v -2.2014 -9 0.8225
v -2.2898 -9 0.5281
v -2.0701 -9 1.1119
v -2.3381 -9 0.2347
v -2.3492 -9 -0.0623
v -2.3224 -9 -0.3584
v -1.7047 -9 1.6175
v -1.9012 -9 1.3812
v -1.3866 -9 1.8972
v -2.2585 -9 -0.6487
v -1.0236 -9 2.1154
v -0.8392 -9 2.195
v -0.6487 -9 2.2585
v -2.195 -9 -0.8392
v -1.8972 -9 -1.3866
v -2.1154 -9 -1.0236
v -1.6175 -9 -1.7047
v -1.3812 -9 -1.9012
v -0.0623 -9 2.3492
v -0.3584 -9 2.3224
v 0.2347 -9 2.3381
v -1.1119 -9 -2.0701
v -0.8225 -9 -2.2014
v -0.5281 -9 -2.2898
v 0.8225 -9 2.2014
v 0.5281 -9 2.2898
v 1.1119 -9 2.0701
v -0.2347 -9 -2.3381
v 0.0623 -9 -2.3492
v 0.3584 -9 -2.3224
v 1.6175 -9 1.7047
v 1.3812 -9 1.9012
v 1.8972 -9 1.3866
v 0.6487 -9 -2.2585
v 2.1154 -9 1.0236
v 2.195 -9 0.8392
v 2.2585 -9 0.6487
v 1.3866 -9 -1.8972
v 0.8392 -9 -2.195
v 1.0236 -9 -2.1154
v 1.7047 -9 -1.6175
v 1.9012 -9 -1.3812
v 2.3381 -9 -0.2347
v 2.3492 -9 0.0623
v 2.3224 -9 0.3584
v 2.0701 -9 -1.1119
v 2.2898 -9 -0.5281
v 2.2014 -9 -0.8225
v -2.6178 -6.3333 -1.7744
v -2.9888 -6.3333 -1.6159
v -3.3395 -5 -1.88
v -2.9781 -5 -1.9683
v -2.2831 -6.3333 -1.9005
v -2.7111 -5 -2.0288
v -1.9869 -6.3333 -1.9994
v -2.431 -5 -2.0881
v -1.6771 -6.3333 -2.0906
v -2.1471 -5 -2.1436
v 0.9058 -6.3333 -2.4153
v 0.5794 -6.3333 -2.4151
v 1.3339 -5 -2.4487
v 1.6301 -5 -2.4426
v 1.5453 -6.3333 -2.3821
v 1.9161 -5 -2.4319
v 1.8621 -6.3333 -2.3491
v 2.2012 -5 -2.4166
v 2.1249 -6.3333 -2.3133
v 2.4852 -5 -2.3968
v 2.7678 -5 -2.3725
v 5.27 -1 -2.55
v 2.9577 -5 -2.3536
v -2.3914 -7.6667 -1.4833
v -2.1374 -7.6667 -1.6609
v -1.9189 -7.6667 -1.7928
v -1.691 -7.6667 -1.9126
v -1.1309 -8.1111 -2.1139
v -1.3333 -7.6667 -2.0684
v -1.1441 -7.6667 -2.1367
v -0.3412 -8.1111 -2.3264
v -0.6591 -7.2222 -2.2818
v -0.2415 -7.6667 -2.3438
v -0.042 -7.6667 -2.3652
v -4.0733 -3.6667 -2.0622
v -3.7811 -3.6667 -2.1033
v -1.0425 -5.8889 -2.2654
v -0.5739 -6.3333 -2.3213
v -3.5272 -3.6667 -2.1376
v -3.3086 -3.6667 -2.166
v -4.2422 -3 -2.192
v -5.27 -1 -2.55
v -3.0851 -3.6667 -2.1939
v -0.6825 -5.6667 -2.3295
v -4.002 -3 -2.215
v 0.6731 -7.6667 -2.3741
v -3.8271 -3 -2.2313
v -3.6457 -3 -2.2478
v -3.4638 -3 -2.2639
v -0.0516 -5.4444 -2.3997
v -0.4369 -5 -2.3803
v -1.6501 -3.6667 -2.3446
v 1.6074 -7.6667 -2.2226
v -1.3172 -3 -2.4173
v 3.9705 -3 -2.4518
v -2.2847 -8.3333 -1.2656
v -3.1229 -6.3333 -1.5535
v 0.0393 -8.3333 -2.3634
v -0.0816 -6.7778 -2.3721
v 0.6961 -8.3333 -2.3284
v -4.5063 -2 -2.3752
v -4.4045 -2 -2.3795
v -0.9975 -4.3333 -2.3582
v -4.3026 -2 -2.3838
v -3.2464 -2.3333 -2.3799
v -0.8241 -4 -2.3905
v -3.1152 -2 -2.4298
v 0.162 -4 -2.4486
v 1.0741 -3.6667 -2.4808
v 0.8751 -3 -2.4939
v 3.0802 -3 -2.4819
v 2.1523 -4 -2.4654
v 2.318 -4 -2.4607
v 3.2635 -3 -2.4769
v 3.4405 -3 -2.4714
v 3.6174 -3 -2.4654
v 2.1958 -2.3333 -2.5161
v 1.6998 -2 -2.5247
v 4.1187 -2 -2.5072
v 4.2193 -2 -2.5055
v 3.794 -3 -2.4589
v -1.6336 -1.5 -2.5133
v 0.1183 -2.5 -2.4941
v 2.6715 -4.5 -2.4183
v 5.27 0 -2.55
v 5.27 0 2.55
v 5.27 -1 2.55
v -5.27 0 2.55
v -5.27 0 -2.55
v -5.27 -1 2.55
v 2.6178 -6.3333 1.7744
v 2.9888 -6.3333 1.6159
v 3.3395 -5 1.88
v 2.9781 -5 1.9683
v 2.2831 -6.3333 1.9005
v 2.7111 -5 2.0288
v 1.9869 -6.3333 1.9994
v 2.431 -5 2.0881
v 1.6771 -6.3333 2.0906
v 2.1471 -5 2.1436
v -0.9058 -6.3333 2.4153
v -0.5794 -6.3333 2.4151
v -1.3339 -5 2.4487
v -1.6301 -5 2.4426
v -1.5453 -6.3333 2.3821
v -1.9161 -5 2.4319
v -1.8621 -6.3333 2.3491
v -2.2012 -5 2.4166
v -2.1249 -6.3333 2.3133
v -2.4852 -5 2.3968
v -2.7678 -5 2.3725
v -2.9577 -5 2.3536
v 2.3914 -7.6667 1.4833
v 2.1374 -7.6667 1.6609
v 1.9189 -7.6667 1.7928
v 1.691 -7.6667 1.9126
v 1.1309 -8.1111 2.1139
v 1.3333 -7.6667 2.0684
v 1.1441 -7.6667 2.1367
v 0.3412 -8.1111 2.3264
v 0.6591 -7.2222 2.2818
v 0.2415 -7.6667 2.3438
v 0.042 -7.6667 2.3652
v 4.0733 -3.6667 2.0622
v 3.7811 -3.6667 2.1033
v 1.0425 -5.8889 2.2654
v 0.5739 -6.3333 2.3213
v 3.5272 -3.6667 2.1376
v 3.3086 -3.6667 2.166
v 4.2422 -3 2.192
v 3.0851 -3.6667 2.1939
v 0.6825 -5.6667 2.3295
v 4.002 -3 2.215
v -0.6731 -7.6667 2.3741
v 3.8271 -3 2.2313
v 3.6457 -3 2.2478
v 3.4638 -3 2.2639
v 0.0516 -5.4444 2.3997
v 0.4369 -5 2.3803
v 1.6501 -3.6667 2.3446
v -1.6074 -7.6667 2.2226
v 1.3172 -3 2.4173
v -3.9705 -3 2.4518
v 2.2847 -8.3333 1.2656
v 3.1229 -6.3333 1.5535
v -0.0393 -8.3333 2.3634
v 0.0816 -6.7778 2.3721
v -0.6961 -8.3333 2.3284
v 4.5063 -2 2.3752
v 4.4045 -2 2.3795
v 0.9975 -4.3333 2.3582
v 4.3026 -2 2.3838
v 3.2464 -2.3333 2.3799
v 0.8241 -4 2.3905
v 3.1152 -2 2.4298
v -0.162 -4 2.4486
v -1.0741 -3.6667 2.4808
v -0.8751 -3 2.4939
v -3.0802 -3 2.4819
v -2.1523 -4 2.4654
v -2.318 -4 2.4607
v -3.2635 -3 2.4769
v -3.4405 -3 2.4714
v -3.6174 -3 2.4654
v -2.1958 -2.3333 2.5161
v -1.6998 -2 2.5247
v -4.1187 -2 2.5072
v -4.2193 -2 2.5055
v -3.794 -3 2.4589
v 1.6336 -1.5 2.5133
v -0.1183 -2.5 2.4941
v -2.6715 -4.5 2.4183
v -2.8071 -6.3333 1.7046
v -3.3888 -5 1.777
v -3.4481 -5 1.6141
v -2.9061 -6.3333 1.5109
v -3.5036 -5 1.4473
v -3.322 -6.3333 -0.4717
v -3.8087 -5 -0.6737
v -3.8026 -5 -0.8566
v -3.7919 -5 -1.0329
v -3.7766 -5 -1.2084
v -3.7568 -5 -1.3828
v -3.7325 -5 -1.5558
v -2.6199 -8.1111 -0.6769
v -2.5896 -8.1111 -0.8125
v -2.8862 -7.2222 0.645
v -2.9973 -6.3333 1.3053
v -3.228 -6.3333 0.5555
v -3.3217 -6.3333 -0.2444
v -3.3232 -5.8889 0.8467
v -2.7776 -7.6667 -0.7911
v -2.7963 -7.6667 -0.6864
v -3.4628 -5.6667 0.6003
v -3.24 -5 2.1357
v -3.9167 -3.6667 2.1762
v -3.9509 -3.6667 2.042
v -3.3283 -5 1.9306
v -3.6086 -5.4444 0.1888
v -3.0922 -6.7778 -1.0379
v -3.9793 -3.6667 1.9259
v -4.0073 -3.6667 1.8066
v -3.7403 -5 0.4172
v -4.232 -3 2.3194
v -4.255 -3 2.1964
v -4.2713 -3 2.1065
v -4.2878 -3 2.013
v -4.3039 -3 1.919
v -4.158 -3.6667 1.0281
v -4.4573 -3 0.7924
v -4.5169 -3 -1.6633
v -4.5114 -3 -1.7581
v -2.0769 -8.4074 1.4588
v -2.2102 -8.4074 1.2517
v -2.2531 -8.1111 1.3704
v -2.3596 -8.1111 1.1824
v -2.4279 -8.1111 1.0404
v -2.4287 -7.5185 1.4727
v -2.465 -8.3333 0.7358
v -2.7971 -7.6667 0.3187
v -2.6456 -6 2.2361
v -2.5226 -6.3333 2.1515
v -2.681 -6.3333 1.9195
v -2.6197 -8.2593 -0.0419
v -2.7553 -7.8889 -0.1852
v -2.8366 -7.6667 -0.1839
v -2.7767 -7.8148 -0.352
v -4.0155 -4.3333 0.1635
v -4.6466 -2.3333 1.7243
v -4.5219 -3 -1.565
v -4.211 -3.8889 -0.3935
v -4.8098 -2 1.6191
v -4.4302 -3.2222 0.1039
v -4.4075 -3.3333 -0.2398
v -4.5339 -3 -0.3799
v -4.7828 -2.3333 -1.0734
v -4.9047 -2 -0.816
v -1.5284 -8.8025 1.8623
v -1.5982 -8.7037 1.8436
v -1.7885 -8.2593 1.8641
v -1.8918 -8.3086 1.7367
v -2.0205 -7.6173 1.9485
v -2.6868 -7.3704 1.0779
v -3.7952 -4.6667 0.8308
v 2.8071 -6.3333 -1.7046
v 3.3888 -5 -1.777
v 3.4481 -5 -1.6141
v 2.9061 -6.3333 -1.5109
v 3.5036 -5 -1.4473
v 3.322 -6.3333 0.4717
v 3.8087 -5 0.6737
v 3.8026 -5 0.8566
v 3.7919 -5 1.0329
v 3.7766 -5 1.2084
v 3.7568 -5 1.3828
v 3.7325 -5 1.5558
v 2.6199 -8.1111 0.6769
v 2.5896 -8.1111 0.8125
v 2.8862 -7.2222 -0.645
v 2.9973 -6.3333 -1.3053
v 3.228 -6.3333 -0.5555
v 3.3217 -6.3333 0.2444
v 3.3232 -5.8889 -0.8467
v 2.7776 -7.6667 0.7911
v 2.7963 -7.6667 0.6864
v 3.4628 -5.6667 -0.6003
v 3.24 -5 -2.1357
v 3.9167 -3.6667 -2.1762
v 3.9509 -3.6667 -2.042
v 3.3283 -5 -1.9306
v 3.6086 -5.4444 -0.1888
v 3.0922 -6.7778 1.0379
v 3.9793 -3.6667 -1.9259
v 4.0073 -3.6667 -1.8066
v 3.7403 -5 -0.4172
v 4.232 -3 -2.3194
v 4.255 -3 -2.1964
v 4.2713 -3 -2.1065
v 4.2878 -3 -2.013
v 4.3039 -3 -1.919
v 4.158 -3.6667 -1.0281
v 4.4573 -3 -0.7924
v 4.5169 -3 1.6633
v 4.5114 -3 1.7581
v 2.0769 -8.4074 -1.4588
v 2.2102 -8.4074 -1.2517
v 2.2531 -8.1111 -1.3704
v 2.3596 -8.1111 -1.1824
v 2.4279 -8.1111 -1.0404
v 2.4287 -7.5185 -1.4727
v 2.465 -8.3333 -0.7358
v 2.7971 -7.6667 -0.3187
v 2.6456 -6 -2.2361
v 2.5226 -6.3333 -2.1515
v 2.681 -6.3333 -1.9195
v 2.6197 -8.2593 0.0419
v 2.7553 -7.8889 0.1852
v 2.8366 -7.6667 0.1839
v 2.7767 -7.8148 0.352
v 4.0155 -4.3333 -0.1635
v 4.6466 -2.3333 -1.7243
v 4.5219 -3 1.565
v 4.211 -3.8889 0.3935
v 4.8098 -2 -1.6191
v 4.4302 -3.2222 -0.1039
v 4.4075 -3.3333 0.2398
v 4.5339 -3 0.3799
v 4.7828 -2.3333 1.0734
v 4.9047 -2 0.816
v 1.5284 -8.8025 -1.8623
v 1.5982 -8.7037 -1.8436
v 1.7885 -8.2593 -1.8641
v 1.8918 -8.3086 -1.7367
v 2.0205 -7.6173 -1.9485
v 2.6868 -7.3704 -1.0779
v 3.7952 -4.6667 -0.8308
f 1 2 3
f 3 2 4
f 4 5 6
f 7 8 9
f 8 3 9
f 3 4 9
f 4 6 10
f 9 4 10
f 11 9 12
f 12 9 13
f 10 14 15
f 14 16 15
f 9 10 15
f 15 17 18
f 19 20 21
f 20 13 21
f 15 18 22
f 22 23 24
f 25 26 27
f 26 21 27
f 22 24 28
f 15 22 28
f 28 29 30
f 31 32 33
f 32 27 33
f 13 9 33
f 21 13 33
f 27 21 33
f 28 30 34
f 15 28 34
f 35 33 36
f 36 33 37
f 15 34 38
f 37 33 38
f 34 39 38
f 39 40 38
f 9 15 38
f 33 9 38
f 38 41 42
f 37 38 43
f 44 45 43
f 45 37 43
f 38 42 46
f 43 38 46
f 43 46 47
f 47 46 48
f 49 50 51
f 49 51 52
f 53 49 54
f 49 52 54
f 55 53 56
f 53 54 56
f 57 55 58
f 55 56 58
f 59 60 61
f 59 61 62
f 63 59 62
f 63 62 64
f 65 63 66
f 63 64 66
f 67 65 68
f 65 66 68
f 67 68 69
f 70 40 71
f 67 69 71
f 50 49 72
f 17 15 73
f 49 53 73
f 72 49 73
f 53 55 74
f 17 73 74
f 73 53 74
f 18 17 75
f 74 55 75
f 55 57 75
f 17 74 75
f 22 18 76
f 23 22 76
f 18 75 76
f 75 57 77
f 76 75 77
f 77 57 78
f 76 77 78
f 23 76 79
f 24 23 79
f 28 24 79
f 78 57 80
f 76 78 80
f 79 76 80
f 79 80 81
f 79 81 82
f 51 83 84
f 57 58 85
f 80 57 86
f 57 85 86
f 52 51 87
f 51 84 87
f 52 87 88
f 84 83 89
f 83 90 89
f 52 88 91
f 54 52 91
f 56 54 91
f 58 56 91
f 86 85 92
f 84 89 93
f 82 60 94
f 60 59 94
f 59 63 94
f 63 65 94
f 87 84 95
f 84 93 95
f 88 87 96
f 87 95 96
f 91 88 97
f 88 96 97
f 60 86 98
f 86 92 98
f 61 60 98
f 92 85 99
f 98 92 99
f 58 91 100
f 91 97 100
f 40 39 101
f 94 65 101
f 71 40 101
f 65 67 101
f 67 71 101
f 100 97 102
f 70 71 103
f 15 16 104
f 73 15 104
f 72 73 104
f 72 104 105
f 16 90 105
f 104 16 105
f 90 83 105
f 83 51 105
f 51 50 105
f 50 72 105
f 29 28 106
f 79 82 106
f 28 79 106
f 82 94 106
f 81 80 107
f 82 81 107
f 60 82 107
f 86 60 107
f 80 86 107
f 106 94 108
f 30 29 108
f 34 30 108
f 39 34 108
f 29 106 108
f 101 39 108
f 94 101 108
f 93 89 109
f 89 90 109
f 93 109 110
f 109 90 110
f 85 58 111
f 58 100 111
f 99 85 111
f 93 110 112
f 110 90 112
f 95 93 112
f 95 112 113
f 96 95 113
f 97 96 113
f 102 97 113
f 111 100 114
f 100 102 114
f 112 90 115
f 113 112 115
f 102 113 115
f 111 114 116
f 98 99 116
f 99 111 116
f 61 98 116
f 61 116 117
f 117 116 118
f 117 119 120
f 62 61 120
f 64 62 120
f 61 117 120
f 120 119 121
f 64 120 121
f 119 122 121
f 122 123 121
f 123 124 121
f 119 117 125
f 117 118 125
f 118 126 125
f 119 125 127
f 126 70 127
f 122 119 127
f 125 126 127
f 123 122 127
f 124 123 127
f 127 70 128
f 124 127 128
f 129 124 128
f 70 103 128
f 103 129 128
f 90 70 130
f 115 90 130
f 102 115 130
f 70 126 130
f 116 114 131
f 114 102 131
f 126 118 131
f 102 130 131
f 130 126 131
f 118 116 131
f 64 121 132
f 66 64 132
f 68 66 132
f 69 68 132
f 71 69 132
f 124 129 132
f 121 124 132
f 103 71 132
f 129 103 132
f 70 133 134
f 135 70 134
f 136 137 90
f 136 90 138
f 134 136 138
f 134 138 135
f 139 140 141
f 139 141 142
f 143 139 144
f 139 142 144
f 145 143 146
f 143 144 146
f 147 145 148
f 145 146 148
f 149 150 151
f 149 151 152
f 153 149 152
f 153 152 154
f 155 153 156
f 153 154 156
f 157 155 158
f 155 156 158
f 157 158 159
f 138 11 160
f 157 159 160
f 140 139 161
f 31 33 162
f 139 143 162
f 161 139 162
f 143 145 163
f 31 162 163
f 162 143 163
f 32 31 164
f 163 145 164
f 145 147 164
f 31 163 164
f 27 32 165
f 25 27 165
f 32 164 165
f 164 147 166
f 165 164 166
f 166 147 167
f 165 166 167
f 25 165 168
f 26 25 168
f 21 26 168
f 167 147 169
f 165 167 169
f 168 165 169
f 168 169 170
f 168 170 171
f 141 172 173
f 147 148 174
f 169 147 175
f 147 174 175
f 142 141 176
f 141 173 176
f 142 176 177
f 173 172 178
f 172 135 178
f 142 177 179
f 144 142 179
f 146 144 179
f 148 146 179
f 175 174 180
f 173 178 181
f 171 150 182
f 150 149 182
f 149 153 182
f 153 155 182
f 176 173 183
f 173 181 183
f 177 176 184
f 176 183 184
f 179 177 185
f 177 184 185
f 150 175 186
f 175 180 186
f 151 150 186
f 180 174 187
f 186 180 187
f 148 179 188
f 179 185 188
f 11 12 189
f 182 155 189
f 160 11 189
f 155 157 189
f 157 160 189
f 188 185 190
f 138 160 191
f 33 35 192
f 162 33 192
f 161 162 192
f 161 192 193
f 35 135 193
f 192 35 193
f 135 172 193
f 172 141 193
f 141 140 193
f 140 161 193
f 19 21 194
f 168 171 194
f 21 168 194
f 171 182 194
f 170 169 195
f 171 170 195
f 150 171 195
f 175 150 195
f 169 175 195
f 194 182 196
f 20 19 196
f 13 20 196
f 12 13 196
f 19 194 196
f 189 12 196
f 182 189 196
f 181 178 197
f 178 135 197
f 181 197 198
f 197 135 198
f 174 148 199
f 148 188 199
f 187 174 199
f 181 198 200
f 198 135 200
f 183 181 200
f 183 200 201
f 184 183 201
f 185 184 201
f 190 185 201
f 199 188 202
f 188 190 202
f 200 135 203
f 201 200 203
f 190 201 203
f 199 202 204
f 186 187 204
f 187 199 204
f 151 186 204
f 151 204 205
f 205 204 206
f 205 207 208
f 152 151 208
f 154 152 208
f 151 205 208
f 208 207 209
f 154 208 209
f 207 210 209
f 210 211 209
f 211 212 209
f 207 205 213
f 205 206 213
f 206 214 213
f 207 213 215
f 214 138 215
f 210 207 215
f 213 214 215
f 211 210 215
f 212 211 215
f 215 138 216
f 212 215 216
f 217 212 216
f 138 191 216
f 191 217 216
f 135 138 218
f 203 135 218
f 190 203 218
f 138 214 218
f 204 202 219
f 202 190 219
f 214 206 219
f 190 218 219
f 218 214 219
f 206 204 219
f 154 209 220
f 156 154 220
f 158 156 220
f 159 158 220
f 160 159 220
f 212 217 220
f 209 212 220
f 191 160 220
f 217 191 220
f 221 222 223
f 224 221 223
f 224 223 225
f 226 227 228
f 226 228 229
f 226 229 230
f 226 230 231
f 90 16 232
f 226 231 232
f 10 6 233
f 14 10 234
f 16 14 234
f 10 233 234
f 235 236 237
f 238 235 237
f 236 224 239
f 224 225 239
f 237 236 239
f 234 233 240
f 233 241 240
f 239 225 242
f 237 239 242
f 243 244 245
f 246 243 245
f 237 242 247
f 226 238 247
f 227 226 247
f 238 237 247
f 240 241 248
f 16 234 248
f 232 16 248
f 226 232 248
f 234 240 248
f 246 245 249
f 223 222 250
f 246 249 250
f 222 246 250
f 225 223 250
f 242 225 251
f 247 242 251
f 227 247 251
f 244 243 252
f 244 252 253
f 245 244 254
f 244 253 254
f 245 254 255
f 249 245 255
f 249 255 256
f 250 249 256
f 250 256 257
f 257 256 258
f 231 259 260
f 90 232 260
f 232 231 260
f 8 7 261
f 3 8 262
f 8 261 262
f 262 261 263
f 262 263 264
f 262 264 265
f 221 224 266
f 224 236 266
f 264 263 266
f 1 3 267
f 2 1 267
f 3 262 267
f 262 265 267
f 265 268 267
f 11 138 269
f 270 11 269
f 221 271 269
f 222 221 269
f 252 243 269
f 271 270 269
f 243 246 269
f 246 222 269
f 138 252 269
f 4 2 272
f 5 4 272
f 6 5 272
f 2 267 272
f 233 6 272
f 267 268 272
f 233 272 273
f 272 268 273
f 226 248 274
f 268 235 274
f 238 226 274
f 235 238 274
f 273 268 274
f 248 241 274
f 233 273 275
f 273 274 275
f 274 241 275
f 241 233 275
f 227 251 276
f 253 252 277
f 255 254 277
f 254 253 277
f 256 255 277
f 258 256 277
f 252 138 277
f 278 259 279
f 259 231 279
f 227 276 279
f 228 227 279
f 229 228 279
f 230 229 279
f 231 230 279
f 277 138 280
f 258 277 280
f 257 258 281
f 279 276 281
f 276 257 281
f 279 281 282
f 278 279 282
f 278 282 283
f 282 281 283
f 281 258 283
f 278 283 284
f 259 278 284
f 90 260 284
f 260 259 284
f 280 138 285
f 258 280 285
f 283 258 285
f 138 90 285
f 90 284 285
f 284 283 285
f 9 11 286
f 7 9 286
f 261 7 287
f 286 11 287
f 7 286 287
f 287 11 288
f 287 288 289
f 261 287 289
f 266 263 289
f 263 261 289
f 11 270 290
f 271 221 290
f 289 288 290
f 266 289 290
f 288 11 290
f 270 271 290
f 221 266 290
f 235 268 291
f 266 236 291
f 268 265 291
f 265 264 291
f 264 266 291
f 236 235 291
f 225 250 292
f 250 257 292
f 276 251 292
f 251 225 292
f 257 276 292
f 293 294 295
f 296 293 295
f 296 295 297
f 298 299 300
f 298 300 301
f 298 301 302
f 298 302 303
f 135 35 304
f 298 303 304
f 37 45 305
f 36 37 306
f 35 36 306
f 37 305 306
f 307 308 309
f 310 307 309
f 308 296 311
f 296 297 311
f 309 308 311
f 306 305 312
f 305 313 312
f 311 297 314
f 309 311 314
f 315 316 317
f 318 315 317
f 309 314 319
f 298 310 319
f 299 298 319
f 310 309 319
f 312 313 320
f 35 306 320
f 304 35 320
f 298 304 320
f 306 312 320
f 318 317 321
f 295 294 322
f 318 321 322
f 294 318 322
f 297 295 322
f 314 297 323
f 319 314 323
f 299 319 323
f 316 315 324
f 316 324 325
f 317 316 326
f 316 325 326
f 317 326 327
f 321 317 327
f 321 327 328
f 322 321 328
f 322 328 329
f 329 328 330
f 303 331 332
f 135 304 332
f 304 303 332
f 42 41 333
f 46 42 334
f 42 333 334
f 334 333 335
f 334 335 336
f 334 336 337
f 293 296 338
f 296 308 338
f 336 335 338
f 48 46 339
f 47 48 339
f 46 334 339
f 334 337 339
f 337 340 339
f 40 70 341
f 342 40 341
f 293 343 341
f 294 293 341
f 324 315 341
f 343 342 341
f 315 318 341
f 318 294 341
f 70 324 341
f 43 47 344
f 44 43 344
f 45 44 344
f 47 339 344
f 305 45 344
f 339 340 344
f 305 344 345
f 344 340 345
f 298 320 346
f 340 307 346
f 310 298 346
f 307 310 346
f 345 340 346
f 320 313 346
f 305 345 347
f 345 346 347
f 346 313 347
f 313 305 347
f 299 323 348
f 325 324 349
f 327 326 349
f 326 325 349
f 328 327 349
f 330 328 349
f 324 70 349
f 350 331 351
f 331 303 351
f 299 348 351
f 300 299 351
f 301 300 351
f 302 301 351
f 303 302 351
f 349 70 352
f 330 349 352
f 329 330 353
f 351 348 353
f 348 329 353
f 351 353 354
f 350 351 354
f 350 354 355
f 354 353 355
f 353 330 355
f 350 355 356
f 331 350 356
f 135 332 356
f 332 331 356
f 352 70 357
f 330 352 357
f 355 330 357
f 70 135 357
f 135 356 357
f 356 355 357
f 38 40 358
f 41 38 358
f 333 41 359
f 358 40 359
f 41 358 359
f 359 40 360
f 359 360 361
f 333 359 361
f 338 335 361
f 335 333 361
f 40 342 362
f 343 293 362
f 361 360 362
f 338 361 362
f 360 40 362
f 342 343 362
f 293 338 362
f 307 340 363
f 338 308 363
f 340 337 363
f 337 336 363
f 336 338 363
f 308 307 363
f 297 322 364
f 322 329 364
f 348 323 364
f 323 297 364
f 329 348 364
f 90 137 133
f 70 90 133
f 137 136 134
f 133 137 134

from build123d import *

# Parameters (mm, degrees)
F0_W     = 10.54
F0_H     = 5.1
F1_DEPTH = 1
F4_W     = 10.54
F4_H     = 5.1


# Not quite as in the source:
# - the arcs of a loft's sections are written as splines that run evenly, so that the points pair up as in the source's solid


with BuildPart() as f1:
    # F0 (on Front) → F1 (new body)
    with BuildSketch(Plane.XZ):
        Rectangle(F0_W, F0_H)
    extrude(amount=F1_DEPTH)

    # F3 (on offset) → F5 section 0
    with BuildSketch(Plane.XZ.offset(9)):
        with BuildLine():
            add(Edge.make_bspline(
                [(-2.1153742408, -1.023568181), (-1.9813894792, -1.3004700217), (-1.7923999056, -1.5506221732), (-1.3328968542, -1.9597225624), (-1.0625641713, -2.1185098365), (-0.4814827659, -2.320625108), (-0.1709626741, -2.3638735816), (0.4432327089, -2.3282335174), (0.7466663404, -2.2493590024), (1.023568181, -2.1153742408)],
                knots=[0, 0, 0, 0, 0.25, 0.25, 0.5, 0.5, 0.75, 0.75, 1, 1, 1, 1], degree=3))
            add(Edge.make_bspline(
                [(1.023568181, -2.1153742408), (1.3004700217, -1.9813894792), (1.5506221732, -1.7923999056), (1.9597225624, -1.3328968542), (2.1185098365, -1.0625641713), (2.320625108, -0.4814827659), (2.3638735816, -0.1709626741), (2.3282335174, 0.4432327089), (2.2493590024, 0.7466663404), (2.1153742408, 1.023568181)],
                knots=[0, 0, 0, 0, 0.25, 0.25, 0.5, 0.5, 0.75, 0.75, 1, 1, 1, 1], degree=3))
            add(Edge.make_bspline(
                [(2.1153742408, 1.023568181), (1.9813894792, 1.3004700217), (1.7923999056, 1.5506221732), (1.3328968542, 1.9597225624), (1.0625641713, 2.1185098365), (0.4814827659, 2.320625108), (0.1709626741, 2.3638735816), (-0.4432327089, 2.3282335174), (-0.7466663404, 2.2493590024), (-1.023568181, 2.1153742408)],
                knots=[0, 0, 0, 0, 0.25, 0.25, 0.5, 0.5, 0.75, 0.75, 1, 1, 1, 1], degree=3))
            add(Edge.make_bspline(
                [(-1.023568181, 2.1153742408), (-1.3004700217, 1.9813894792), (-1.5506221732, 1.7923999056), (-1.9597225624, 1.3328968542), (-2.1185098365, 1.0625641713), (-2.320625108, 0.4814827659), (-2.3638735816, 0.1709626741), (-2.3282335174, -0.4432327089), (-2.2493590024, -0.7466663404), (-2.1153742408, -1.023568181)],
                knots=[0, 0, 0, 0, 0.25, 0.25, 0.5, 0.5, 0.75, 0.75, 1, 1, 1, 1], degree=3))
        make_face()
    # F4 (on face) → F5 section 1
    with BuildSketch(Plane.XZ.offset(1)):
        Rectangle(F4_W, F4_H)
    loft(ruled=True)


solid = f1.part
